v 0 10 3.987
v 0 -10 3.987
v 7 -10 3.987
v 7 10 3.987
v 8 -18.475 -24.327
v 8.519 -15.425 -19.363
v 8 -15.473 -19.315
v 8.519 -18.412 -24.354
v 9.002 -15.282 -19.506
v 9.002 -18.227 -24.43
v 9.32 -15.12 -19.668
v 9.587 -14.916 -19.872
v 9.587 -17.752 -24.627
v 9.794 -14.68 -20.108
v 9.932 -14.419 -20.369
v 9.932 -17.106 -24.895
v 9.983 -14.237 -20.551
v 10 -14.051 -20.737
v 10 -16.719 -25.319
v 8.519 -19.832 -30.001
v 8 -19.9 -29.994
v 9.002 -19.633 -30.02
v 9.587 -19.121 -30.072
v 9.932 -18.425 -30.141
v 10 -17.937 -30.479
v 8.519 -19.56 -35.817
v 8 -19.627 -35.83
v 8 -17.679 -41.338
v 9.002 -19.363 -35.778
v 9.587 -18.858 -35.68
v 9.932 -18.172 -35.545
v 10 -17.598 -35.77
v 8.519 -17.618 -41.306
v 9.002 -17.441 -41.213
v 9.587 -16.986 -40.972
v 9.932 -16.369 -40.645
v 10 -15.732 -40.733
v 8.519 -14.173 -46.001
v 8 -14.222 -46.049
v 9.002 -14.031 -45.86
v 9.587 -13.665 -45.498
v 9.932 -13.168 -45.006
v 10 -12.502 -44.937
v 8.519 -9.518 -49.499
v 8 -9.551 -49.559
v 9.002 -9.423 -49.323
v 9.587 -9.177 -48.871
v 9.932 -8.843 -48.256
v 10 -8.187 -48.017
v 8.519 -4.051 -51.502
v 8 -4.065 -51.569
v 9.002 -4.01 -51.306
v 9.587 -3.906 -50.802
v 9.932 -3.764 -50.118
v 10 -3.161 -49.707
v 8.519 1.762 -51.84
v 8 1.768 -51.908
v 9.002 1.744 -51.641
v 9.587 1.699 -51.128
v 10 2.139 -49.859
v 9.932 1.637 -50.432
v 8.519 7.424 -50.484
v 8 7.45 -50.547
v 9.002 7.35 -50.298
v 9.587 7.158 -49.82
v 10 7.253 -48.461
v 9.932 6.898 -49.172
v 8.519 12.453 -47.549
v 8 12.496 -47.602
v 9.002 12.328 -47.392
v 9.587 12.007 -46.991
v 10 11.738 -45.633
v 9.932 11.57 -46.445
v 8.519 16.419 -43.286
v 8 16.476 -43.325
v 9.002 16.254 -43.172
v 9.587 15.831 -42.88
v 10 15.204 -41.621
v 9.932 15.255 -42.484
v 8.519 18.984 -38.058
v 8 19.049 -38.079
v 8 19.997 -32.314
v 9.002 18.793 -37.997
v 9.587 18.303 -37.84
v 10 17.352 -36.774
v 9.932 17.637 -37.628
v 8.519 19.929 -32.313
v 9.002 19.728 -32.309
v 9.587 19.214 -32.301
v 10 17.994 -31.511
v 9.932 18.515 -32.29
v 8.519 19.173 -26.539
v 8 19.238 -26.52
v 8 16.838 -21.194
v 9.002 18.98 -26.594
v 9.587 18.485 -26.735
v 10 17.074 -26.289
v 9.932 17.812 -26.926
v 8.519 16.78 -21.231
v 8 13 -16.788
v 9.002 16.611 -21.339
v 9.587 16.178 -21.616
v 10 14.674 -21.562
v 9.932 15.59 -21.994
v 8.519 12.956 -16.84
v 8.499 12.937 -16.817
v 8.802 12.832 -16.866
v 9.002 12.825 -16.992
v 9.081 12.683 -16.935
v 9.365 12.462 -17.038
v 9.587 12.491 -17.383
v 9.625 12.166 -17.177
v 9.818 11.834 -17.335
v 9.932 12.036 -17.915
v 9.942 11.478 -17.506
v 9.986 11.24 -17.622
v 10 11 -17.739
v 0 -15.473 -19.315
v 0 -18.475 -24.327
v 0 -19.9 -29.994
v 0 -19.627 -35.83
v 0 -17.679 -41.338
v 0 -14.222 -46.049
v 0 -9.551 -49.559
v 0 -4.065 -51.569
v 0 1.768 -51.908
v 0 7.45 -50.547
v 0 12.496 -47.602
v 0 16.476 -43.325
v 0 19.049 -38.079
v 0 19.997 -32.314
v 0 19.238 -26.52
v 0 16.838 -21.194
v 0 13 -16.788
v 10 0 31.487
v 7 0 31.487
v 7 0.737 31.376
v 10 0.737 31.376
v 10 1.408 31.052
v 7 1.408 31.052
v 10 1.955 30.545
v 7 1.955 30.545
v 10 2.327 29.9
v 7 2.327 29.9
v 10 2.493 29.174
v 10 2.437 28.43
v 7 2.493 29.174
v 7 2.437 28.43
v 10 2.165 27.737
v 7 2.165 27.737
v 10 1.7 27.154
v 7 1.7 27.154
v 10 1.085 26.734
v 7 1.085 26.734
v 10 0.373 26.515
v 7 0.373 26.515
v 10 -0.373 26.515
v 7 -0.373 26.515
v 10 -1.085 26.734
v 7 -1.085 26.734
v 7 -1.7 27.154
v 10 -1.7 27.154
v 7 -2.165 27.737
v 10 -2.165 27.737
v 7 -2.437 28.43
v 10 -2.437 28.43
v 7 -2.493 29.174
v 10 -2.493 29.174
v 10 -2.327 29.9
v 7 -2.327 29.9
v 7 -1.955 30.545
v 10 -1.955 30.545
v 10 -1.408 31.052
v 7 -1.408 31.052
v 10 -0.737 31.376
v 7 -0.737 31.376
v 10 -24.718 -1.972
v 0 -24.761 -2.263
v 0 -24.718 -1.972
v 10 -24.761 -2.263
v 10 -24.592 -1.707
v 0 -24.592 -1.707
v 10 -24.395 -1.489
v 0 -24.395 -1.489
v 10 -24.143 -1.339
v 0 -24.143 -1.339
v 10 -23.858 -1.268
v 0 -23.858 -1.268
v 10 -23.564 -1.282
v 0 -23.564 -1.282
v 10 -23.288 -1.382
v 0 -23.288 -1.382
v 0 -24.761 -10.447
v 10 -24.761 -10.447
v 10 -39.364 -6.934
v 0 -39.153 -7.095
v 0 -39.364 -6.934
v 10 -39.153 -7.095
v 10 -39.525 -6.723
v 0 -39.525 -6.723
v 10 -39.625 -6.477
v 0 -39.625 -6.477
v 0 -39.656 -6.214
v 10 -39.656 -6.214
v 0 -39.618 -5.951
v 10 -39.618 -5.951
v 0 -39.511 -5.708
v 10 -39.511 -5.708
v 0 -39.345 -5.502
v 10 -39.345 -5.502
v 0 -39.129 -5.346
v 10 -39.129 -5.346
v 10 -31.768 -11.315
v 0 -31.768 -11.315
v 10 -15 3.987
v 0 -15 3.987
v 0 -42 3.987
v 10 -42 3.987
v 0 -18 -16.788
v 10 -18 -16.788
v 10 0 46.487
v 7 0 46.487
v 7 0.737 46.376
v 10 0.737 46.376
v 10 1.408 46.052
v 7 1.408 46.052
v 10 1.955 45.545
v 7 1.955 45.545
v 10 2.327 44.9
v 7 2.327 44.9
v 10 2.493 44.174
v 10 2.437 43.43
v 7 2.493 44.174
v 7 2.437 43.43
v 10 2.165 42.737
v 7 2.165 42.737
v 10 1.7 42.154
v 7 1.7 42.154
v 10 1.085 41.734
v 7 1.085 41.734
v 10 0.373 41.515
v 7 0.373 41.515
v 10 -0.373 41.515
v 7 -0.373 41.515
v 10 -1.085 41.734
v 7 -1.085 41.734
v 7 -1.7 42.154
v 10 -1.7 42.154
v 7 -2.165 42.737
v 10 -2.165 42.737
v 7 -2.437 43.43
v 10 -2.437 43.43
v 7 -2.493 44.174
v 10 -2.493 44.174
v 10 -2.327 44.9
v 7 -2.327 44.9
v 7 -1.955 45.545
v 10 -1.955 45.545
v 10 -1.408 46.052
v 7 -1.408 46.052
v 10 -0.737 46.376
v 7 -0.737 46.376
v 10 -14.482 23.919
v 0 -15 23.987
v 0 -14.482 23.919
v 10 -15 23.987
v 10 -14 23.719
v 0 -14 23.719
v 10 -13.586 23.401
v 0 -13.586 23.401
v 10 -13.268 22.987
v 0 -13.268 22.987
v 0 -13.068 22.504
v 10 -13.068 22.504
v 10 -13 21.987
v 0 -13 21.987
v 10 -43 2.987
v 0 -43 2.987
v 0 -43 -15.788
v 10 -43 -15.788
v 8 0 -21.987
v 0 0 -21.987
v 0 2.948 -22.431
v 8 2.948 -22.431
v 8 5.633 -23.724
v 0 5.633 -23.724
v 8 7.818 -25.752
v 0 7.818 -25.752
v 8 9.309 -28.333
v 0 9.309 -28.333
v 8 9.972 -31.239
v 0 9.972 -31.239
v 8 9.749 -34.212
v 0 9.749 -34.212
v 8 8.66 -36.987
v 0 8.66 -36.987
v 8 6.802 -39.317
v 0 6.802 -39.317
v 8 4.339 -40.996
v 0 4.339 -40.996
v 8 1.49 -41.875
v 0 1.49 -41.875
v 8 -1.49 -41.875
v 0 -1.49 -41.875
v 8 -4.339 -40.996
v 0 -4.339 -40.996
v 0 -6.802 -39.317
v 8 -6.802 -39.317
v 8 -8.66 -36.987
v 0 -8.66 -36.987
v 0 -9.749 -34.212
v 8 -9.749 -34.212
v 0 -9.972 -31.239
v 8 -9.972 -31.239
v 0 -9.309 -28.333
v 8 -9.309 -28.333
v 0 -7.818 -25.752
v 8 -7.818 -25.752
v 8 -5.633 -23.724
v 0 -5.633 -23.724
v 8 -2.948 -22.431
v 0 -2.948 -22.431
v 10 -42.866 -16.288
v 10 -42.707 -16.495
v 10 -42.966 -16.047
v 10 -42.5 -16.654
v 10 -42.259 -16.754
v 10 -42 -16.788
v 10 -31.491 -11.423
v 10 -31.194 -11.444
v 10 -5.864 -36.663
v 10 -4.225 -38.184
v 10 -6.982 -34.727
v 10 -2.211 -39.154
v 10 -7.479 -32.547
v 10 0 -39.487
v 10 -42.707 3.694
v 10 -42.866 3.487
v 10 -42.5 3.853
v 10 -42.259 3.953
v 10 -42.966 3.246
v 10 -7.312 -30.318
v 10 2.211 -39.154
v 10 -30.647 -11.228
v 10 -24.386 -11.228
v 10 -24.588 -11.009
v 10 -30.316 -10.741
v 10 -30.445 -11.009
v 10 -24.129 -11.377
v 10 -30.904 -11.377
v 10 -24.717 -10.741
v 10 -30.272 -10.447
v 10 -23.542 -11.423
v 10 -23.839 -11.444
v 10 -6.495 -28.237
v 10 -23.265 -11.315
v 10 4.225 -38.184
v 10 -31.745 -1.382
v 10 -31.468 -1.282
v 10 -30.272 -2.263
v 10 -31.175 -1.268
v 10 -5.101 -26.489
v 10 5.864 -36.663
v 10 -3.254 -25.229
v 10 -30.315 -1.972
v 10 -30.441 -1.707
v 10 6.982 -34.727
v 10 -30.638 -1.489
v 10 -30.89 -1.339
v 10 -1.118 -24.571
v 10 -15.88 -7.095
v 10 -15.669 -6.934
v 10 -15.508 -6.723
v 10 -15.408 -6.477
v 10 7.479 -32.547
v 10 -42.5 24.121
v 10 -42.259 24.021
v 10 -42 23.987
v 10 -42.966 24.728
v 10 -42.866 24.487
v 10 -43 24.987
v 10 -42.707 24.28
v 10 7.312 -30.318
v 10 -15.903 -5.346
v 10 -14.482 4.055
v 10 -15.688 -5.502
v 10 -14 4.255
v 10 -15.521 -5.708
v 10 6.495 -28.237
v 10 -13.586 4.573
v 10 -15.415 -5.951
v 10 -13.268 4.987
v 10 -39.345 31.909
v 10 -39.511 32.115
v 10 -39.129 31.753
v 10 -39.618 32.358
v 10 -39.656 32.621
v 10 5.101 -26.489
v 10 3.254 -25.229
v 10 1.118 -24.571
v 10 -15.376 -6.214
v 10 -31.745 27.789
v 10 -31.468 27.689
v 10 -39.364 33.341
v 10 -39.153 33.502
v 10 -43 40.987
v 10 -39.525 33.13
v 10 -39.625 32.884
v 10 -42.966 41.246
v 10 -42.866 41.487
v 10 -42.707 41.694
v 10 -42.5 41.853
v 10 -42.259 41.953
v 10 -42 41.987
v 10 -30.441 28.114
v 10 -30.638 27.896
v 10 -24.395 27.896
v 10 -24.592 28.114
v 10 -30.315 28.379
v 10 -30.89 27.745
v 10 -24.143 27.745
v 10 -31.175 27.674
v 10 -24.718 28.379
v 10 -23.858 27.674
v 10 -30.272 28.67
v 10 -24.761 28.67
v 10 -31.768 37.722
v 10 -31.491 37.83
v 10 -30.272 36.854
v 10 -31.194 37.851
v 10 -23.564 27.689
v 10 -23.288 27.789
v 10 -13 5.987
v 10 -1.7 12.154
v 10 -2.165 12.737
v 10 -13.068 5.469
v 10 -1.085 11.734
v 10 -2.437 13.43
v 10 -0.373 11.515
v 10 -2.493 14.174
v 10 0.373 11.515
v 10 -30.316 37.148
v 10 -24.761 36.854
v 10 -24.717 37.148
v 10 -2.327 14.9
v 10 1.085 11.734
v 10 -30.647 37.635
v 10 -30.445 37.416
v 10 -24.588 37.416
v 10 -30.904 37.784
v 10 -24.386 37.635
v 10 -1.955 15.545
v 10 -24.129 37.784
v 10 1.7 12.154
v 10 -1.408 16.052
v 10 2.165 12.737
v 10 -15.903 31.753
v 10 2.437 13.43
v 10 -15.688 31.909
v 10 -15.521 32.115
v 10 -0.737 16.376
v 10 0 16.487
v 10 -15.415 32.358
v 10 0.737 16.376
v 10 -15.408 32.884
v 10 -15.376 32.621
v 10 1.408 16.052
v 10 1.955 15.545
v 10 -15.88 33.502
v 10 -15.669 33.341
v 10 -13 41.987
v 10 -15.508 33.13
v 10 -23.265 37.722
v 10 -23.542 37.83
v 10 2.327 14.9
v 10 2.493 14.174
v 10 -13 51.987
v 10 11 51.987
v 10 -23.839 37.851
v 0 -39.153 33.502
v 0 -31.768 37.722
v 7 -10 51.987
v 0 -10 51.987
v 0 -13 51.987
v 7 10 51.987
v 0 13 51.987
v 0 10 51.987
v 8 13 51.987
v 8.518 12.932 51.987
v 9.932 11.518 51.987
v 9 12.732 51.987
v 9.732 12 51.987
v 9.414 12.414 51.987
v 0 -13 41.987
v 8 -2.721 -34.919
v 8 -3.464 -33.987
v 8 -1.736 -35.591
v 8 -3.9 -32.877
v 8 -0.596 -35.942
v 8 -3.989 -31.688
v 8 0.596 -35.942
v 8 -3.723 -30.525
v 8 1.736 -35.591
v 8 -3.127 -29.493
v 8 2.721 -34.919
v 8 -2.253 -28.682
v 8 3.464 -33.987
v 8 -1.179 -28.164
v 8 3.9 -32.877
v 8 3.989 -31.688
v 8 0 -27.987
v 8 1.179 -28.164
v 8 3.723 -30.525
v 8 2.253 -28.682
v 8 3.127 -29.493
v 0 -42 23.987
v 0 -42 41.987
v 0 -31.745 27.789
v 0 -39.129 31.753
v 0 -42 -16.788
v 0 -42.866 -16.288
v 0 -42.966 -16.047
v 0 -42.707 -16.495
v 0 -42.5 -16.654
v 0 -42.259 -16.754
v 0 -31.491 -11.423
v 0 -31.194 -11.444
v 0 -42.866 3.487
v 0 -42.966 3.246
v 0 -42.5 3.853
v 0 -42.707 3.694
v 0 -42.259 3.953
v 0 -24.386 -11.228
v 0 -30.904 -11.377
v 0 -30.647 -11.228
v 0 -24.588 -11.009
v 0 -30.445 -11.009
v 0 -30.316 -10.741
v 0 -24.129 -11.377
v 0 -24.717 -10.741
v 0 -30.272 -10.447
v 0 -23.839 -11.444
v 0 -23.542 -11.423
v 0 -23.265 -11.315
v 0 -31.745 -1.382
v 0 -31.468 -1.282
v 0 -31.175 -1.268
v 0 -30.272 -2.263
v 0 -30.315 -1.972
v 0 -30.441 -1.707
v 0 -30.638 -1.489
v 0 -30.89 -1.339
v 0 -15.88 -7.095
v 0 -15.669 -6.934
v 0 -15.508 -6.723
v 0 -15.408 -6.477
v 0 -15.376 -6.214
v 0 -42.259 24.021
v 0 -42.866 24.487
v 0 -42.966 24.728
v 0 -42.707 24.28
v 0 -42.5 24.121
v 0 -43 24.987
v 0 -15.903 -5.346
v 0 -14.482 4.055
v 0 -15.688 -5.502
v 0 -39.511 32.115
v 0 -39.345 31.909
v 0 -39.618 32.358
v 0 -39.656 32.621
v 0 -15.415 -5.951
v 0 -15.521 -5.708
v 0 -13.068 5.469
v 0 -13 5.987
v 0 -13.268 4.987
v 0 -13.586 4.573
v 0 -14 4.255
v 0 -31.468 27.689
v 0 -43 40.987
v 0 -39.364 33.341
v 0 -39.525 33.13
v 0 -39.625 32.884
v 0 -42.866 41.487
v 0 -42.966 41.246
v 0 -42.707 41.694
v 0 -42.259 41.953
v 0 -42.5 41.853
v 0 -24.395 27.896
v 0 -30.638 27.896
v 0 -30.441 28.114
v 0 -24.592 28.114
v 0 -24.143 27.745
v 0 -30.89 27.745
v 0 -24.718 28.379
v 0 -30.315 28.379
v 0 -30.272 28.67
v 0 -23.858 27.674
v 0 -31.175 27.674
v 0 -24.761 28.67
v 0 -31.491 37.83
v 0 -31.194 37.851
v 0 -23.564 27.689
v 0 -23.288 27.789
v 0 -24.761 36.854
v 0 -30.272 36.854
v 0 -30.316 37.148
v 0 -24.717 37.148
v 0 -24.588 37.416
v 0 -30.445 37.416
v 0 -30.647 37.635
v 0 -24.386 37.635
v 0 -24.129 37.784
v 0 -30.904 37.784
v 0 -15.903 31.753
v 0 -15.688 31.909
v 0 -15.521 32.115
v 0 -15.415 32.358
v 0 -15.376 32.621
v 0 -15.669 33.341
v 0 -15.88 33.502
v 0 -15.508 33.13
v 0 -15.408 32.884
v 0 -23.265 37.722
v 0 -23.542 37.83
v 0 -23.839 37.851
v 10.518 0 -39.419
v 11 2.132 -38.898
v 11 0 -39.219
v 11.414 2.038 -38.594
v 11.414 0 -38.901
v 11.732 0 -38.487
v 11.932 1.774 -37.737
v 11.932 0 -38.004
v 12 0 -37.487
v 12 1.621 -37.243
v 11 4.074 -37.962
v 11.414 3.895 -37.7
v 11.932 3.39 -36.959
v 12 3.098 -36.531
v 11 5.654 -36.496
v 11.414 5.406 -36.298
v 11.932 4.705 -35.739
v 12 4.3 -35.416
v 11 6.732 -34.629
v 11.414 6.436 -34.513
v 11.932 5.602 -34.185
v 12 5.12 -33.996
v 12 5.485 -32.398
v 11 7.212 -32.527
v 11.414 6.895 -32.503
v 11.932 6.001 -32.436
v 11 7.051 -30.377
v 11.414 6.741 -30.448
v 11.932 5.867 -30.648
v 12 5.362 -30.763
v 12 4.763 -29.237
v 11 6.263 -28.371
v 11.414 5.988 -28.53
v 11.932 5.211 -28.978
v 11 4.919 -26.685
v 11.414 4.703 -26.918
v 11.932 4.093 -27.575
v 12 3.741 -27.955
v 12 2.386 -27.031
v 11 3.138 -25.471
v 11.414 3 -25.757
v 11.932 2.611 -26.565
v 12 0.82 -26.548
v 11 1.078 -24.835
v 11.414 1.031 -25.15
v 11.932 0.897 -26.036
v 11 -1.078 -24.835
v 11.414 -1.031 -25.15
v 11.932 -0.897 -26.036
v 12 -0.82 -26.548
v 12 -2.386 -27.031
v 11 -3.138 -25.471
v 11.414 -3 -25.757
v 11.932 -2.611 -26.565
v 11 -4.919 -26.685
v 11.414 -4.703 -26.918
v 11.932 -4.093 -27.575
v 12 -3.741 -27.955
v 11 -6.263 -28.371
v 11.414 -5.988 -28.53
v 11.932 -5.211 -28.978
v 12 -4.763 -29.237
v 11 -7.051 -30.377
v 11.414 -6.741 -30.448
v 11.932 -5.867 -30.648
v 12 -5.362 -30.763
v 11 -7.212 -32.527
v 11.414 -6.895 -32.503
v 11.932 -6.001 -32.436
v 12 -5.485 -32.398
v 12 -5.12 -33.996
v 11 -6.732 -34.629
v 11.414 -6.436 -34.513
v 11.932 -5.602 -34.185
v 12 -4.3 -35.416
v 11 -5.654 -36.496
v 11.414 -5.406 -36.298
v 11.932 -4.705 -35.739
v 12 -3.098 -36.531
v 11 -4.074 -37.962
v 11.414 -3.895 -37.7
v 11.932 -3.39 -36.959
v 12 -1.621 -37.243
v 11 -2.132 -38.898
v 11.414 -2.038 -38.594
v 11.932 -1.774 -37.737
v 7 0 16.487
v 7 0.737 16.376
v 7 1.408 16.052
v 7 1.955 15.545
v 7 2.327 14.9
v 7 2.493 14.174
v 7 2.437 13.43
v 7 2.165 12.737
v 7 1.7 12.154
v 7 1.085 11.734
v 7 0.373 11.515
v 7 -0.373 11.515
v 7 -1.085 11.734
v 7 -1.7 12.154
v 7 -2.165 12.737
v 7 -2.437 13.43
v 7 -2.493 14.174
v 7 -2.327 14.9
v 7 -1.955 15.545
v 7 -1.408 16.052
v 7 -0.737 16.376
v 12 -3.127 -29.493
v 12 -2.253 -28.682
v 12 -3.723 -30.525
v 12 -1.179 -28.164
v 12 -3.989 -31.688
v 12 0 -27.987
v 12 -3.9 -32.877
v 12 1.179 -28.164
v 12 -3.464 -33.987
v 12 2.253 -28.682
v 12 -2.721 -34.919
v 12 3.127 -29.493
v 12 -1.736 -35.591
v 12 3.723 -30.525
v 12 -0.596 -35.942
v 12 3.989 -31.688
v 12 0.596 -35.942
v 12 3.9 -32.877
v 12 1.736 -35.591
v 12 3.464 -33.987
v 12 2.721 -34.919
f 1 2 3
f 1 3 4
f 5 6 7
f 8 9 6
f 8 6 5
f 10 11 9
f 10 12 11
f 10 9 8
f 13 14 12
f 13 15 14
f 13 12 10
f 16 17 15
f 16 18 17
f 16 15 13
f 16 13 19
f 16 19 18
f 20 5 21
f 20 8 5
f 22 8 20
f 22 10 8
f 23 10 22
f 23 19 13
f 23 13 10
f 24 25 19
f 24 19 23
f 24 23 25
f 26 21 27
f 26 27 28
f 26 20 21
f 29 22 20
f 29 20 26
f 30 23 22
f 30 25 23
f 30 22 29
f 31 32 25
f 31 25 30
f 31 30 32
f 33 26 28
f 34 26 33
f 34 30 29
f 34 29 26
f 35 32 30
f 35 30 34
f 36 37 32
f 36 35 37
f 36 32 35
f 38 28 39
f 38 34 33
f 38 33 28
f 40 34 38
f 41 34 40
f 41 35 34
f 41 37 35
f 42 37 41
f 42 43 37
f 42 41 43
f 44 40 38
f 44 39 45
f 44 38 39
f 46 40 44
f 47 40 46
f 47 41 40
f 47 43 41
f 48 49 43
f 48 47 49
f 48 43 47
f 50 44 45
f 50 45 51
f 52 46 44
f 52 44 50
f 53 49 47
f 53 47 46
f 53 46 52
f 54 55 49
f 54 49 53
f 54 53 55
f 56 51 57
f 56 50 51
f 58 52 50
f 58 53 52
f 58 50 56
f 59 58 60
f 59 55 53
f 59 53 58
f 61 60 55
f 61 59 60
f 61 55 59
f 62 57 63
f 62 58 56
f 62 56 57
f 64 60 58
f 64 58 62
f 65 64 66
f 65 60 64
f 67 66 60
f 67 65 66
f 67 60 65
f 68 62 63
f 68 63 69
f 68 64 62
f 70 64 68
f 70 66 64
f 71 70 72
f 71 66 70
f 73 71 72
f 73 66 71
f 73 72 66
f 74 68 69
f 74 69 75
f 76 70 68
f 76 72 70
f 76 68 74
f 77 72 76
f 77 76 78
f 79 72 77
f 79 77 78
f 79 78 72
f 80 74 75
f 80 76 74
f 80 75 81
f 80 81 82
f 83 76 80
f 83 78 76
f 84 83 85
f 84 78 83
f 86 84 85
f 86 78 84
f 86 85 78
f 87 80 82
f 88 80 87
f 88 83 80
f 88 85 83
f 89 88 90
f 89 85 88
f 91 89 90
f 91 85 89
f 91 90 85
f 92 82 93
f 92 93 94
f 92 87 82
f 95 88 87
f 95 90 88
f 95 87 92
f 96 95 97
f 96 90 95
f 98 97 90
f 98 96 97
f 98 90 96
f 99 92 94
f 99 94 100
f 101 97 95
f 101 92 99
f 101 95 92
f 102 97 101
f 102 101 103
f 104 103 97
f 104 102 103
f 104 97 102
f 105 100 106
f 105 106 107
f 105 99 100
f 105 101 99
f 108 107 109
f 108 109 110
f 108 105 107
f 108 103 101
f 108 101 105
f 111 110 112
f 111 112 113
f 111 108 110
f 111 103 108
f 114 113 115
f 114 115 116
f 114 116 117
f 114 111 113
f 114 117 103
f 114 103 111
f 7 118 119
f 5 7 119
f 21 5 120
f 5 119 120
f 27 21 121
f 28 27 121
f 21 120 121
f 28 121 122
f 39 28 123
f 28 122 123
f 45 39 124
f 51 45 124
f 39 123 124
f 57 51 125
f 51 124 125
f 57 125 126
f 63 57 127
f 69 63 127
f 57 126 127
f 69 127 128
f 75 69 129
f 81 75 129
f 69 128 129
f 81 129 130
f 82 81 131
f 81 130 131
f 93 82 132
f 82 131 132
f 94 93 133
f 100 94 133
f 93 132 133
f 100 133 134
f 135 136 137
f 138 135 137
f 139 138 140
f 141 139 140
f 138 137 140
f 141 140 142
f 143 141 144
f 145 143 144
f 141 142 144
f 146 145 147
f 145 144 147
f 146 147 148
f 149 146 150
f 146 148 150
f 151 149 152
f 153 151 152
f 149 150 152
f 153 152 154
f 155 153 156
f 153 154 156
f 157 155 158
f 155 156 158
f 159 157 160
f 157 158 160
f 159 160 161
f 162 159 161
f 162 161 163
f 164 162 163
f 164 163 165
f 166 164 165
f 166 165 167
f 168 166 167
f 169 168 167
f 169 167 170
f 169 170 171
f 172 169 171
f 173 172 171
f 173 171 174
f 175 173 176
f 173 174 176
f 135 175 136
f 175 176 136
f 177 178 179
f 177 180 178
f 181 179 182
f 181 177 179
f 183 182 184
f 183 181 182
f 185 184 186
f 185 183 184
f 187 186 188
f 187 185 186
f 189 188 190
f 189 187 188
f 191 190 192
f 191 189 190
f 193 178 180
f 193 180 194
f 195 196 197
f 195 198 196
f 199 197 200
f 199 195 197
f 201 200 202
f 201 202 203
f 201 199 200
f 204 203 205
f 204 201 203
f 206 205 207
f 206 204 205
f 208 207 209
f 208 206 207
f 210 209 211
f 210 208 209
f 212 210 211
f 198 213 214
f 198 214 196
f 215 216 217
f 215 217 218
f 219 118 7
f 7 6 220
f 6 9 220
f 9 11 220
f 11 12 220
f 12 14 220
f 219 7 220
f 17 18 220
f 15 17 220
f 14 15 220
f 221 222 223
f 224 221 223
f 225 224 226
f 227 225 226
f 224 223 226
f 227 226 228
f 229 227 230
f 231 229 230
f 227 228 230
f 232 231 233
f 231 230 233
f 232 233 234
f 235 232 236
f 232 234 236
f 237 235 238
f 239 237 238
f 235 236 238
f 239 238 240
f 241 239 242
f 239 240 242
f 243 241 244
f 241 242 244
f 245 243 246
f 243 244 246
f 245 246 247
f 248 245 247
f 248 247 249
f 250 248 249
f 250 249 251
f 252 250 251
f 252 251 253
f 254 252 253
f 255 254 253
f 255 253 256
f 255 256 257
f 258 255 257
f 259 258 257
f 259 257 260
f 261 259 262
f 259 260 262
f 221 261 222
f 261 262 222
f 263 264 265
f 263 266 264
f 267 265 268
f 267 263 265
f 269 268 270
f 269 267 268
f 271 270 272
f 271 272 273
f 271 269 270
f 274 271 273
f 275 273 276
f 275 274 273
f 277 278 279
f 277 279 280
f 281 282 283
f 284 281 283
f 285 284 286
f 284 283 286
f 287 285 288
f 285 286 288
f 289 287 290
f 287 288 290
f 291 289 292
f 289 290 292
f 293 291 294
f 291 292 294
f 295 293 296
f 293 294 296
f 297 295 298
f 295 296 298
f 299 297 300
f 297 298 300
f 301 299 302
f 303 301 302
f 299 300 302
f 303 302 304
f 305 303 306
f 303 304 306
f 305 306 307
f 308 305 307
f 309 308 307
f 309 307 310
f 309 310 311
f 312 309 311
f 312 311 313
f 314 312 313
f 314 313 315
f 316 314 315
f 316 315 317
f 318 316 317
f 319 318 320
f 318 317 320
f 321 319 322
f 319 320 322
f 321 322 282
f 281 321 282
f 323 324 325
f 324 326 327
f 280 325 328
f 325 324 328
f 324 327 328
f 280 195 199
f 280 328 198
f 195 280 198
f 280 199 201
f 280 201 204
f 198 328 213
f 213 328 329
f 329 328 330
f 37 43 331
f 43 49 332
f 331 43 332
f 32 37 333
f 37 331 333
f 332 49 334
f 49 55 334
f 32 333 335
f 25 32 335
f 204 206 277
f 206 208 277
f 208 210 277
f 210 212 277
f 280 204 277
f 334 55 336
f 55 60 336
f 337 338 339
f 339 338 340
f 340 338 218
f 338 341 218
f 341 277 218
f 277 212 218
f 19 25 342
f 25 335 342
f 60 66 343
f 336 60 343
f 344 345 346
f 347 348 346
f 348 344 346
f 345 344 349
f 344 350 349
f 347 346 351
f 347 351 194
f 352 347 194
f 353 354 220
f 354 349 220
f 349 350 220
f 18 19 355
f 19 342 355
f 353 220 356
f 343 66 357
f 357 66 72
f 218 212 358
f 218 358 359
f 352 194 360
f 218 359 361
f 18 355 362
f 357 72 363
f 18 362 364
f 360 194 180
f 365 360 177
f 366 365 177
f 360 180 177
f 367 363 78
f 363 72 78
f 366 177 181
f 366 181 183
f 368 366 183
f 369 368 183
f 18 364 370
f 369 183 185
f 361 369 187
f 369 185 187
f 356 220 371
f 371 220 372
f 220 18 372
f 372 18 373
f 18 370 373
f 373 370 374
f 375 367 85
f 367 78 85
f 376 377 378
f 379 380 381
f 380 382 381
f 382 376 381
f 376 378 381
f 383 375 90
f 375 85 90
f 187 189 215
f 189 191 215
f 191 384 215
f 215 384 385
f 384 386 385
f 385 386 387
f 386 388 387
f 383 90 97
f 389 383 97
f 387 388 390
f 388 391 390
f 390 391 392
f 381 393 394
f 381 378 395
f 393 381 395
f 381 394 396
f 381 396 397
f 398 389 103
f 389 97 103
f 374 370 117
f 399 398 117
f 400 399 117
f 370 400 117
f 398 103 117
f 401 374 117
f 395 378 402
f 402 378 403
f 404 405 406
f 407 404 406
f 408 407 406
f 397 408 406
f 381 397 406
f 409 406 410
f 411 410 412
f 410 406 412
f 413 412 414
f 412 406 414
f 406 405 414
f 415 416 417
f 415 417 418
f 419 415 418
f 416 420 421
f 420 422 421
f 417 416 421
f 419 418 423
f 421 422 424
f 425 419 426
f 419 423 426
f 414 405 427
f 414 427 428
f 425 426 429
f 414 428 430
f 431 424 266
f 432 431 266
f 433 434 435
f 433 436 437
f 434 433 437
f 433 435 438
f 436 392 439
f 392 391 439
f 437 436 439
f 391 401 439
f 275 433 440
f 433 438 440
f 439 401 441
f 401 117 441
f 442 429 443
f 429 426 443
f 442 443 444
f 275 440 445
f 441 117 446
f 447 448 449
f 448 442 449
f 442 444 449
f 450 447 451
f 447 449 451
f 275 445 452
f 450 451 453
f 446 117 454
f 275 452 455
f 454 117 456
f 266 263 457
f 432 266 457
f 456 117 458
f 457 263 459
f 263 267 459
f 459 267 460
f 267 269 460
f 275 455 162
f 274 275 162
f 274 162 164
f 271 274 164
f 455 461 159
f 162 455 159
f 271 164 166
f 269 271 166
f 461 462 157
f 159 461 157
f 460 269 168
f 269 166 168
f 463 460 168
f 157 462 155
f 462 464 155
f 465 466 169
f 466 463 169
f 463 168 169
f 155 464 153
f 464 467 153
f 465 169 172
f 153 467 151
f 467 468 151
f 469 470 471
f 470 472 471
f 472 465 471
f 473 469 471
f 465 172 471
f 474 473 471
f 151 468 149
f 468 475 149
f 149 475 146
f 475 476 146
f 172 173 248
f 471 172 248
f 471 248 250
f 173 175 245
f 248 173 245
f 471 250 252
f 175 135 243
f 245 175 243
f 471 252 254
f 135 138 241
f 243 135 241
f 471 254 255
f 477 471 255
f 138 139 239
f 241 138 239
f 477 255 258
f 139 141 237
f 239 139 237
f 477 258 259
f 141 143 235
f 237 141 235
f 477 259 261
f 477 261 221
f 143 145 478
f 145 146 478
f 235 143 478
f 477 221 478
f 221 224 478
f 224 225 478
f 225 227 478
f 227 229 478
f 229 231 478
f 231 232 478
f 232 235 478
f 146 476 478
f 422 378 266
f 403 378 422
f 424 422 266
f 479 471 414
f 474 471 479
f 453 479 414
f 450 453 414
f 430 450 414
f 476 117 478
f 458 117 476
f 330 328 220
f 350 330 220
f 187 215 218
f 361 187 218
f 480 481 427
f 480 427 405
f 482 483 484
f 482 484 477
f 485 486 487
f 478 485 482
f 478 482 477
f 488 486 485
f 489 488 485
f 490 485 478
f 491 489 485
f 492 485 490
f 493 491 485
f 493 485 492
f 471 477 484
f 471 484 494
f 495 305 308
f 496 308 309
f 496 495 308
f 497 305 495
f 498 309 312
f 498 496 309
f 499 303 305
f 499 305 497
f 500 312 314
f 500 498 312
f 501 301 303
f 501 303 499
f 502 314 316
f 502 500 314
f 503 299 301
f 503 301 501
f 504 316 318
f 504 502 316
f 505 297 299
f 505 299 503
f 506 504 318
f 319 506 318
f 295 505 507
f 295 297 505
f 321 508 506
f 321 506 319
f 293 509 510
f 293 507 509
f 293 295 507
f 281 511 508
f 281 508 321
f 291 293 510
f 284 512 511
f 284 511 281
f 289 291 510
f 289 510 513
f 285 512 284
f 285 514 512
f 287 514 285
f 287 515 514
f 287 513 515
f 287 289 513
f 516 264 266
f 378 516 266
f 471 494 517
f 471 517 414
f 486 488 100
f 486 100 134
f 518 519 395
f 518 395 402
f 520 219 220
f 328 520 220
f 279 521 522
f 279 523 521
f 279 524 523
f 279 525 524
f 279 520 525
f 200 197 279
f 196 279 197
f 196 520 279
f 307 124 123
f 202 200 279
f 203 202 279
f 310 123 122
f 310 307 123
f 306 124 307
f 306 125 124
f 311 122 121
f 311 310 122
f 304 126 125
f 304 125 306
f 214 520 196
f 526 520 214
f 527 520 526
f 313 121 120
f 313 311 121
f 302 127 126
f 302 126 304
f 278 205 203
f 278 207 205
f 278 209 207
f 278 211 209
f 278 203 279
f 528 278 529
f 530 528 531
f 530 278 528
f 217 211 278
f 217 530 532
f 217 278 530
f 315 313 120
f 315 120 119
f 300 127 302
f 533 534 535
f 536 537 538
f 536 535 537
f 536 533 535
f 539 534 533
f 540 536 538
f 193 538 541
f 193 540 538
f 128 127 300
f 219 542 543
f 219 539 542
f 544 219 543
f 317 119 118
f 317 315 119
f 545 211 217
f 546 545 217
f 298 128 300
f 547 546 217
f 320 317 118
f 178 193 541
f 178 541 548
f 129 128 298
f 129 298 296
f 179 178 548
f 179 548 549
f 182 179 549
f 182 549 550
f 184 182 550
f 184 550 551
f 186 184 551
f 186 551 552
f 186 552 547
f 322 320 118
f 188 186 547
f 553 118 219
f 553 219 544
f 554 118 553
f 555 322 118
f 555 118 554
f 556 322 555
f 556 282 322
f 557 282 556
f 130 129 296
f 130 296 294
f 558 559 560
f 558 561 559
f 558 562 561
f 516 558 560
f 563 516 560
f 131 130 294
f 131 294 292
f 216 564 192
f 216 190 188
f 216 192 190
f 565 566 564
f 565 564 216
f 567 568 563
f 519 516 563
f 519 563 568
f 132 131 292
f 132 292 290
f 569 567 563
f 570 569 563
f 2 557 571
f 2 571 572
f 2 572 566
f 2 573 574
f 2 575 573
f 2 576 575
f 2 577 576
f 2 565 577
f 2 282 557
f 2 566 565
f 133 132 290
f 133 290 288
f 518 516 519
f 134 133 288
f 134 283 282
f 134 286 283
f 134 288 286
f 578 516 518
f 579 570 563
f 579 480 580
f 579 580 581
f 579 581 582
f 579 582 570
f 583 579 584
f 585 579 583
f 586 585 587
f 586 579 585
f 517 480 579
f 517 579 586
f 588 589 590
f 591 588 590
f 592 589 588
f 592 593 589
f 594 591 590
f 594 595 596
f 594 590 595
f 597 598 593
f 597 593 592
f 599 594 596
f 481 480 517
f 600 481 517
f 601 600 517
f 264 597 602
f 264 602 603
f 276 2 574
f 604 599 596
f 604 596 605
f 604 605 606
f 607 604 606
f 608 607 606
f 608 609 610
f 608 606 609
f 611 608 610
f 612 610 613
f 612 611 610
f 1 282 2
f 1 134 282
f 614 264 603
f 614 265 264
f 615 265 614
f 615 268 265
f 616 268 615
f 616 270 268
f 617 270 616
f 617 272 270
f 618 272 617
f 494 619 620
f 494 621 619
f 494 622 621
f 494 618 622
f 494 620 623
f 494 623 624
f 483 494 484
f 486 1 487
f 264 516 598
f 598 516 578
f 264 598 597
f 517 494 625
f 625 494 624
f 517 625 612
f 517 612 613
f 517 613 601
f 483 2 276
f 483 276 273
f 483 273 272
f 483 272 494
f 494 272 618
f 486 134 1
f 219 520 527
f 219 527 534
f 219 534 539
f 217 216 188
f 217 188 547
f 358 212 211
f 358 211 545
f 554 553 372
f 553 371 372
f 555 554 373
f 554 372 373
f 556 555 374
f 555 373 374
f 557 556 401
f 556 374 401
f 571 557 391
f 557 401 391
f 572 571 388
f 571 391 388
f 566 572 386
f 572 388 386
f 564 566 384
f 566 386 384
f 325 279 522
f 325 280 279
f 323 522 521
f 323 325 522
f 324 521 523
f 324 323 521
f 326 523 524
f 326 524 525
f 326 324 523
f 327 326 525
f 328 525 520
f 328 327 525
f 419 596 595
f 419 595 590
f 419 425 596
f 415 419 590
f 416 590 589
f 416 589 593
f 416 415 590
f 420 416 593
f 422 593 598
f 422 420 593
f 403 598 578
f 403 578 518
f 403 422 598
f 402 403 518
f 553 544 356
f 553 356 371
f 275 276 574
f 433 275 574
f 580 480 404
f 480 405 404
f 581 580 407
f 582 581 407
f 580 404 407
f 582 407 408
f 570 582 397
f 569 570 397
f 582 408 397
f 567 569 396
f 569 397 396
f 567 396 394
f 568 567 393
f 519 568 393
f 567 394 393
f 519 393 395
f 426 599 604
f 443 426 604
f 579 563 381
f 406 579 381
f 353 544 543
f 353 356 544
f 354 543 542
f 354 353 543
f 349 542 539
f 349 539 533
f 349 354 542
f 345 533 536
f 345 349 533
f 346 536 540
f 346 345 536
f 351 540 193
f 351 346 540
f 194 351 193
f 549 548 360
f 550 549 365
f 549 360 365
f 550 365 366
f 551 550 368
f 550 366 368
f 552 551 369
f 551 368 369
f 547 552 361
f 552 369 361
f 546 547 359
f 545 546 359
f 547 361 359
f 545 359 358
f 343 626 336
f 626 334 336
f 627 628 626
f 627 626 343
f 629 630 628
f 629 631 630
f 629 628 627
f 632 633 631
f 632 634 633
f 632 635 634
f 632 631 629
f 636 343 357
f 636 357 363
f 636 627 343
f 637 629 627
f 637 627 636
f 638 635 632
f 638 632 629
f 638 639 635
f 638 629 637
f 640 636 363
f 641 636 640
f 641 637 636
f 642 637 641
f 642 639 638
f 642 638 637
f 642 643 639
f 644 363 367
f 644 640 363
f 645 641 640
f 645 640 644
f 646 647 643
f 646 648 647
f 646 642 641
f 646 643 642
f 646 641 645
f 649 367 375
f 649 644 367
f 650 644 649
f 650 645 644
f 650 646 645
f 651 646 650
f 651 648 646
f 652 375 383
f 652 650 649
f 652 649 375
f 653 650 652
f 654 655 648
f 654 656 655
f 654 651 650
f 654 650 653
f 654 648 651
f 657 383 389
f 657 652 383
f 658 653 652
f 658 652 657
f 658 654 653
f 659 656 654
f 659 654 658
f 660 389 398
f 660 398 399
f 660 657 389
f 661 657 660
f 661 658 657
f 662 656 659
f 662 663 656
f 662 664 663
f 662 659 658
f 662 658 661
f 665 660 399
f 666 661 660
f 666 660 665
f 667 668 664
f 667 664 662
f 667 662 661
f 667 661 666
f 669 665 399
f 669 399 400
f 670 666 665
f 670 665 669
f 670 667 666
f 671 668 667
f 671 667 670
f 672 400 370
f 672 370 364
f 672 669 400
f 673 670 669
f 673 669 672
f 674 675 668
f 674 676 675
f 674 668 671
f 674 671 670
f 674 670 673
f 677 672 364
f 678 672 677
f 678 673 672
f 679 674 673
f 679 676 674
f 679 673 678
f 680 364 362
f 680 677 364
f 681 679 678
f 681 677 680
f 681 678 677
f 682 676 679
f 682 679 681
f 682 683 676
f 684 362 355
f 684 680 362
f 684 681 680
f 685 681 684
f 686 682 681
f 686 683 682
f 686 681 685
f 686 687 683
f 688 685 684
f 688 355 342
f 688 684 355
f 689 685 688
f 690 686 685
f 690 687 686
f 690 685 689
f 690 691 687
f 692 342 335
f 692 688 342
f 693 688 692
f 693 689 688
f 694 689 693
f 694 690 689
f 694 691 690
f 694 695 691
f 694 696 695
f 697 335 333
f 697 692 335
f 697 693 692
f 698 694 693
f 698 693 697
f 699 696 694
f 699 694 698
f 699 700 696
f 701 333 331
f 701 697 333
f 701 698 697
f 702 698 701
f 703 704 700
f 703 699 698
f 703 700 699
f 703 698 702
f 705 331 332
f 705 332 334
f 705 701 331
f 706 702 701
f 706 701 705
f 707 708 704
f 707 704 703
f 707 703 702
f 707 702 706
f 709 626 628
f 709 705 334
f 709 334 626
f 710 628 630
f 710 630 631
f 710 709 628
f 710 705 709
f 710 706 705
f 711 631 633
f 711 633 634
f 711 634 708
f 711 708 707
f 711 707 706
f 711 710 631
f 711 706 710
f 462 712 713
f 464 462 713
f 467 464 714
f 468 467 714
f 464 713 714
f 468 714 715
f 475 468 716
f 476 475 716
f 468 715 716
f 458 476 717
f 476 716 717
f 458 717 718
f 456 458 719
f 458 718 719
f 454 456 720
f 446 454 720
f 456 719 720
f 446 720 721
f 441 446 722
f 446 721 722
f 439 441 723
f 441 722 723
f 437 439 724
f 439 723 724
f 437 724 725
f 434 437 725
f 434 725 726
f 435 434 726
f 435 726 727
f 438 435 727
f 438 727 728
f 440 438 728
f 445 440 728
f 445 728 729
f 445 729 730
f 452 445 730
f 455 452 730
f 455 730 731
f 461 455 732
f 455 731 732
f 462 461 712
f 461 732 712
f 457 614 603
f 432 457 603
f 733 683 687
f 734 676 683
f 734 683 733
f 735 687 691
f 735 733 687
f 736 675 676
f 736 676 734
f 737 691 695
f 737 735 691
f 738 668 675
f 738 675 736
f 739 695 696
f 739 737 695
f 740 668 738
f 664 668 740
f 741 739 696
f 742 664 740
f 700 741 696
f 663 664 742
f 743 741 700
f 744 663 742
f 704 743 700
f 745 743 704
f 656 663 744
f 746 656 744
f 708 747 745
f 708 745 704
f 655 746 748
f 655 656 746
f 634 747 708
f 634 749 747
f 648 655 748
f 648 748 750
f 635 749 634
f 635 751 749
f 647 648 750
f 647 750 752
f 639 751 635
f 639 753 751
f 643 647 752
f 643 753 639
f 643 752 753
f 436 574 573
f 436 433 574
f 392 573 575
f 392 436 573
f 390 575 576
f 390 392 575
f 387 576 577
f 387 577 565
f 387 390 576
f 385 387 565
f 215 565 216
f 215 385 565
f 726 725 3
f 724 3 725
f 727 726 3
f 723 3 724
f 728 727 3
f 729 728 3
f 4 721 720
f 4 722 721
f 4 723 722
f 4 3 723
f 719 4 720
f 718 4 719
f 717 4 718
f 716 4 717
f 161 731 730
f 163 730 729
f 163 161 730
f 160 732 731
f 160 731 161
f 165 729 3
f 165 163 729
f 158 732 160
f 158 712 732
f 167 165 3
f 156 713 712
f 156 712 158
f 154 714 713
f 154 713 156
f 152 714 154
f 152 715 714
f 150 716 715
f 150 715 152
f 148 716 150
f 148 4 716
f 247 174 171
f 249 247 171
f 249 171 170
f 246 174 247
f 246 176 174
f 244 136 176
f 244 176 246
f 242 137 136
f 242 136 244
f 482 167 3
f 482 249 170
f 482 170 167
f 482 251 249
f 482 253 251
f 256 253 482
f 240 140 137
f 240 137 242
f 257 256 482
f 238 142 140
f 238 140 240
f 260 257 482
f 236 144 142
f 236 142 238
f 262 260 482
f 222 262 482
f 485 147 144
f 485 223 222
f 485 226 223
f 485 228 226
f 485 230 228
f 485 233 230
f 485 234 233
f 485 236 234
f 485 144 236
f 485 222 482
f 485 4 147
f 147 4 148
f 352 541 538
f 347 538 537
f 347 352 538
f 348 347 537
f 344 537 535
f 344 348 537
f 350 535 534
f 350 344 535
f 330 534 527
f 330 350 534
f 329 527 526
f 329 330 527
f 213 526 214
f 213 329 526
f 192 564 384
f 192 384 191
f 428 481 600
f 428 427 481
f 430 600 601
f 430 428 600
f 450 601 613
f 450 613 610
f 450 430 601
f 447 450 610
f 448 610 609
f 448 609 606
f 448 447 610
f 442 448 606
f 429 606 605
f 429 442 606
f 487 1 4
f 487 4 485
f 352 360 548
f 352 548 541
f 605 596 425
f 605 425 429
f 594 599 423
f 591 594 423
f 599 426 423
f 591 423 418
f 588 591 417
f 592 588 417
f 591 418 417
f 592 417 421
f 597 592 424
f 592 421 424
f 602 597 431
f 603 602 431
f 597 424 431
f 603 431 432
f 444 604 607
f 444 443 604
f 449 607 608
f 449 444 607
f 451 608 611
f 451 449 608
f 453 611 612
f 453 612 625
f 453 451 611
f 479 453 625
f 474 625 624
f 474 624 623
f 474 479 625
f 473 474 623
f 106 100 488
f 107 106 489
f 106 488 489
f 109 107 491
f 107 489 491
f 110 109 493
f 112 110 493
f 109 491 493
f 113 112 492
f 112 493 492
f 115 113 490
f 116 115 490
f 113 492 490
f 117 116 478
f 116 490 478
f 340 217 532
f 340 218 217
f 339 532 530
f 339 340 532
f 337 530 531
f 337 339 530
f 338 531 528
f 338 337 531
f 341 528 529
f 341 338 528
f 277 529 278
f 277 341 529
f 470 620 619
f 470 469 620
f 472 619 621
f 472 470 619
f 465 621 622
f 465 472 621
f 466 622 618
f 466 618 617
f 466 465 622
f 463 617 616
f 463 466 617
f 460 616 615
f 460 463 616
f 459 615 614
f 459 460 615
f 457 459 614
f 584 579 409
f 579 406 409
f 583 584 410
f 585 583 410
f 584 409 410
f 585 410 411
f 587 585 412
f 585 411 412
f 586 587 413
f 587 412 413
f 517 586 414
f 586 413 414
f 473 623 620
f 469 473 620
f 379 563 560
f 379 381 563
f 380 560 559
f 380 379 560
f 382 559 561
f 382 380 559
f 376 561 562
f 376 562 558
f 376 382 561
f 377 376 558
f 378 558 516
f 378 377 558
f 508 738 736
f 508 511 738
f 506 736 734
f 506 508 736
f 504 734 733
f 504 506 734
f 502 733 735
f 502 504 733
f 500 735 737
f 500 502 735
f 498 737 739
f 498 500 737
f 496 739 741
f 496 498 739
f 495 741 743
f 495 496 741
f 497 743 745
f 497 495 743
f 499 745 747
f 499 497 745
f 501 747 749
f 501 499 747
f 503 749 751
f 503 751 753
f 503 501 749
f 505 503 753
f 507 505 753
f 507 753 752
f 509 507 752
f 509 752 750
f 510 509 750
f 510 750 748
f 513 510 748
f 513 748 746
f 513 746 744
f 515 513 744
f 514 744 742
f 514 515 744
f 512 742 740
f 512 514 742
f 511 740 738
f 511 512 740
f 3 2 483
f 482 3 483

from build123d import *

# Parameters (mm, degrees)
SKETCH_1_R           = 20
SKETCH_1_W           = 63.973509934
SKETCH_1_H           = 26
EXTRUDE_1_DEPTH      = 10
SKETCH_2_W           = 45
SKETCH_2_H           = 20
CUT_EXTRUDE_1_DEPTH  = 7
SKETCH_3_R           = 10
CUT_EXTRUDE_2_DEPTH  = 8
SKETCH_4_R           = 4
CUT_EXTRUDE_3_DEPTH  = 7
SKETCH_6_W           = 10
SKETCH_6_H           = 8
EXTRUDE_2_DEPTH      = 15
CHAMFER_2_SIZE       = 5
EXTRUDE_3_DEPTH      = 20
SKETCH_8_W           = 10
SKETCH_8_H           = 12.77482578
EXTRUDE_4_DEPTH      = 15
SKETCH_9_W           = 7
SKETCH_9_H           = 20
EXTRUDE_5_DEPTH      = 10
SKETCH_10_W          = 7
SKETCH_10_H          = 20
EXTRUDE_6_DEPTH      = 7
SKETCH_11_W          = 10
SKETCH_11_H          = 15
CUT_EXTRUDE_5_DEPTH  = 60.88841868
SKETCH_12_R          = 10
SKETCH_12_W          = 48
SKETCH_12_H          = 20
EXTRUDE_7_DEPTH      = 10
SKETCH_13_R          = 10
CUT_EXTRUDE_6_DEPTH  = 8
SKETCH_14_R          = 4
CUT_EXTRUDE_7_DEPTH  = 8
SKETCH_15_W          = 48
SKETCH_15_H          = 20
CUT_EXTRUDE_8_DEPTH  = 7
SKETCH_16_W          = 10
SKETCH_16_H          = 18
SKETCH_16_H_2        = 20.77482578
EXTRUDE_8_DEPTH      = 15
CUT_EXTRUDE_9_DEPTH  = 15
FILLET_1_R           = 1
FILLET_2_R           = 2
SKETCH_18_R          = 7.5
SKETCH_18_R_2        = 4
EXTRUDE_9_DEPTH      = 2
FILLET_3_R           = 2
SKETCH_19_R          = 2.5
CUT_EXTRUDE_10_DEPTH = 3


# Some blends are built 0.0001 mm under size
with BuildPart() as part:
    # 草图1 → 凸台-拉伸1 (new body)
    with BuildSketch(Plane(origin=(0, 0, 0), x_dir=(0, 0, -1), z_dir=(1, 0, 0))):
        with Locations((31.986754967, 0)):
            Circle(SKETCH_1_R)
        Rectangle(SKETCH_1_W, SKETCH_1_H)
    extrude(amount=EXTRUDE_1_DEPTH)

    # 草图2 → 切除-拉伸1 (cut)
    with BuildSketch(Plane(origin=(10, 0, 0), x_dir=(0, 0, -1), z_dir=(1, 0, 0))):
        with Locations((-9.486754967, 0)):
            Rectangle(SKETCH_2_W, SKETCH_2_H)
    extrude(amount=-CUT_EXTRUDE_1_DEPTH, mode=Mode.SUBTRACT)

    # 草图3 → 切除-拉伸2 (cut)
    with BuildSketch(Plane(origin=(10, 0, 0), x_dir=(0, 0, -1), z_dir=(1, 0, 0))):
        with Locations((31.986754967, 0)):
            Circle(SKETCH_3_R)
    extrude(amount=-CUT_EXTRUDE_2_DEPTH, mode=Mode.SUBTRACT)

    # 草图4 → 切除-拉伸3 (cut)
    with BuildSketch(Plane(origin=(2, 0, 0), x_dir=(0, 0, -1), z_dir=(1, 0, 0))):
        with Locations((31.986754967, 0)):
            Circle(SKETCH_4_R)
    extrude(amount=-CUT_EXTRUDE_3_DEPTH, mode=Mode.SUBTRACT)

    # 草图6 → 凸台-拉伸2 (add)
    with BuildSketch(Plane.XZ.offset(13)):
        with Locations((5, -12.788070813)):
            Rectangle(SKETCH_6_W, SKETCH_6_H)
        with Locations((5, 27.986754967)):
            Rectangle(SKETCH_6_W, SKETCH_6_H)
    extrude(amount=EXTRUDE_2_DEPTH)

    # 倒角2
    # the kernel refuses this chamfer: 5, 3.546264764 mm, written as the material it adds along each edge
    with BuildSketch(Plane(origin=(10, -13, -16.788070813), x_dir=(0, -0.6995038411281902, -0.7146288381019251), z_dir=(-1, 0, 0))) as chamfer_2_piece_1:
        with BuildLine():
            Line((3.535736125, 0), (CHAMFER_2_SIZE * 0.699503841128, CHAMFER_2_SIZE * 0.714628838102))
            Line((CHAMFER_2_SIZE * 0.699503841128, CHAMFER_2_SIZE * 0.714628838102), (0, 0))
            ThreePointArc((0, 0), (1.768947181, 0.07828713), (3.535736125, 0))
        make_face()
    extrude(amount=10)

    # 草图7 → 凸台-拉伸3 (add)
    with BuildSketch(Plane.XY.offset(31.986754967)):
        Polygon((3, -10), (3, 10), (10, 10), (10, 13), (0, 13), (0, -28), (10, -28), (10, -10), align=None)
    extrude(amount=EXTRUDE_3_DEPTH)

    # 草图8 → 凸台-拉伸4 (add)
    with BuildSketch(Plane.XZ.offset(13)):
        with Locations((5, -2.400657923)):
            Rectangle(SKETCH_8_W, SKETCH_8_H)
    extrude(amount=EXTRUDE_4_DEPTH)

    # 草图9 → 凸台-拉伸5 (add)
    with BuildSketch(Plane.XY.offset(-13.013245033)):
        with Locations((6.5, 0)):
            Rectangle(SKETCH_9_W, SKETCH_9_H)
    extrude(amount=EXTRUDE_5_DEPTH)

    # 草图10 → 凸台-拉伸6 (add)
    with BuildSketch(Plane.XY.offset(-3.013245033)):
        with Locations((6.5, 0)):
            Rectangle(SKETCH_10_W, SKETCH_10_H)
    extrude(amount=EXTRUDE_6_DEPTH)

    # 草图11 → 切除-拉伸5 (cut, through all)
    with BuildSketch(Plane(origin=(10, 0, 0), x_dir=(0, 0, -1), z_dir=(1, 0, 0))):
        with Locations((-46.986754967, -20.5)):
            Rectangle(SKETCH_11_W, SKETCH_11_H)
    extrude(amount=-CUT_EXTRUDE_5_DEPTH, mode=Mode.SUBTRACT)

    # 草图12 → 凸台-拉伸7 (add)
    with BuildSketch(Plane(origin=(10, 0, 0), x_dir=(0, 0, -1), z_dir=(1, 0, 0))):
        with Locations((31.986754967, 0)):
            Circle(SKETCH_12_R)
        with Locations((-27.986754967, 0)):
            Rectangle(SKETCH_12_W, SKETCH_12_H)
    extrude(amount=-EXTRUDE_7_DEPTH)

    # 草图13 → 切除-拉伸6 (cut)
    with BuildSketch(Plane.ZY):
        with Locations((-31.986754967, 0)):
            Circle(SKETCH_13_R)
    extrude(amount=-CUT_EXTRUDE_6_DEPTH, mode=Mode.SUBTRACT)

    # 草图14 → 切除-拉伸7 (cut)
    with BuildSketch(Plane.ZY.offset(-8)):
        with Locations((-31.986754967, 0)):
            Circle(SKETCH_14_R)
    extrude(amount=-CUT_EXTRUDE_7_DEPTH, mode=Mode.SUBTRACT)

    # 草图15 → 切除-拉伸8 (cut)
    with BuildSketch(Plane.ZY):
        with Locations((27.986754967, 0)):
            Rectangle(SKETCH_15_W, SKETCH_15_H)
    extrude(amount=-CUT_EXTRUDE_8_DEPTH, mode=Mode.SUBTRACT)

    # 草图16 → 凸台-拉伸8 (add)
    with BuildSketch(Plane.XZ.offset(28)):
        with Locations((5, 32.986754967)):
            Rectangle(SKETCH_16_W, SKETCH_16_H)
        with Locations((5, -6.400657923)):
            Rectangle(SKETCH_16_W, SKETCH_16_H_2)
    extrude(amount=EXTRUDE_8_DEPTH)

    # 草图17 → 切除-拉伸9 (cut)
    with BuildSketch(Plane.ZY):
        Polygon((-0.590983184, -30.271873826), (-12.170144499, -30.271873826), (-6.199884933, -40.719828065), align=None)
        Polygon((-6.199884933, -14.312910757), (-0.590983184, -24.760864996), (-12.170144499, -24.760864996), align=None)
        Polygon((26.997900492, -24.760864996), (38.577061807, -24.760864996), (32.606802242, -14.312910757), align=None)
        Polygon((32.606802242, -40.719828065), (26.997900492, -30.271873826), (38.577061807, -30.271873826), align=None)
    extrude(amount=-CUT_EXTRUDE_9_DEPTH, mode=Mode.SUBTRACT)

    # 圆角1
    fillet_1_edges = [part.edges().sort_by_distance(p)[0] for p in [
        (5, -43, 41.986754967),
        (5, -43, 23.986754967),
        (5, -43, 3.986754967),
        (5, -43, -16.788070813),
        (5, -30.271873826, 38.577061807),
        (5, -40.719828065, 32.606802242),
        (5, -30.271873826, 26.997900492),
        (5, -24.760864996, 26.997900492),
        (5, -14.312910757, 32.606802242),
        (5, -24.760864996, 38.577061807),
        (5, -24.760864996, -12.170144499),
        (5, -14.312910757, -6.199884933),
        (5, -24.760864996, -0.590983184),
        (5, -30.271873826, -0.590983184),
        (5, -40.719828065, -6.199884933),
        (5, -30.271873826, -12.170144499),
    ]]
    fillet(fillet_1_edges, radius=FILLET_1_R)

    # 圆角2
    fillet_2_edges = [part.edges().sort_by_distance(p)[0] for p in [
        (5, -13, 3.986754967),
        (10, 13, 17.599342077),
        (5, -13, 23.986754967),
        (10, 1.767868063, -51.908467808),
    ]]
    fillet(fillet_2_edges, radius=FILLET_2_R)

    # 草图18 → 凸台-拉伸9 (add)
    with BuildSketch(Plane(origin=(10, 0, 0), x_dir=(0, 0, -1), z_dir=(1, 0, 0))):
        with Locations((31.986754967, 0)):
            Circle(SKETCH_18_R)
        with Locations(Location((31.986754967, 0, 0), (0, 0, 180))):
            Circle(SKETCH_18_R_2, mode=Mode.SUBTRACT)
    extrude(amount=EXTRUDE_9_DEPTH)

    # 圆角3
    fillet_3_edges = [part.edges().sort_by_distance(p)[0] for p in [
        (12, 0, -24.486754967),
    ]]
    fillet(fillet_3_edges, radius=FILLET_3_R - 0.0001)  # a hair under: the kernel refuses the full size

    # 草图19 → 切除-拉伸10 (cut)
    with BuildSketch(Plane.ZY.offset(-7)):
        with Locations((43.986754967, 0)):
            Circle(SKETCH_19_R)
        with Locations((28.986754967, 0)):
            Circle(SKETCH_19_R)
        with Locations((13.986754967, 0)):
            Circle(SKETCH_19_R)
    extrude(amount=-CUT_EXTRUDE_10_DEPTH, mode=Mode.SUBTRACT)


solid = part.part
